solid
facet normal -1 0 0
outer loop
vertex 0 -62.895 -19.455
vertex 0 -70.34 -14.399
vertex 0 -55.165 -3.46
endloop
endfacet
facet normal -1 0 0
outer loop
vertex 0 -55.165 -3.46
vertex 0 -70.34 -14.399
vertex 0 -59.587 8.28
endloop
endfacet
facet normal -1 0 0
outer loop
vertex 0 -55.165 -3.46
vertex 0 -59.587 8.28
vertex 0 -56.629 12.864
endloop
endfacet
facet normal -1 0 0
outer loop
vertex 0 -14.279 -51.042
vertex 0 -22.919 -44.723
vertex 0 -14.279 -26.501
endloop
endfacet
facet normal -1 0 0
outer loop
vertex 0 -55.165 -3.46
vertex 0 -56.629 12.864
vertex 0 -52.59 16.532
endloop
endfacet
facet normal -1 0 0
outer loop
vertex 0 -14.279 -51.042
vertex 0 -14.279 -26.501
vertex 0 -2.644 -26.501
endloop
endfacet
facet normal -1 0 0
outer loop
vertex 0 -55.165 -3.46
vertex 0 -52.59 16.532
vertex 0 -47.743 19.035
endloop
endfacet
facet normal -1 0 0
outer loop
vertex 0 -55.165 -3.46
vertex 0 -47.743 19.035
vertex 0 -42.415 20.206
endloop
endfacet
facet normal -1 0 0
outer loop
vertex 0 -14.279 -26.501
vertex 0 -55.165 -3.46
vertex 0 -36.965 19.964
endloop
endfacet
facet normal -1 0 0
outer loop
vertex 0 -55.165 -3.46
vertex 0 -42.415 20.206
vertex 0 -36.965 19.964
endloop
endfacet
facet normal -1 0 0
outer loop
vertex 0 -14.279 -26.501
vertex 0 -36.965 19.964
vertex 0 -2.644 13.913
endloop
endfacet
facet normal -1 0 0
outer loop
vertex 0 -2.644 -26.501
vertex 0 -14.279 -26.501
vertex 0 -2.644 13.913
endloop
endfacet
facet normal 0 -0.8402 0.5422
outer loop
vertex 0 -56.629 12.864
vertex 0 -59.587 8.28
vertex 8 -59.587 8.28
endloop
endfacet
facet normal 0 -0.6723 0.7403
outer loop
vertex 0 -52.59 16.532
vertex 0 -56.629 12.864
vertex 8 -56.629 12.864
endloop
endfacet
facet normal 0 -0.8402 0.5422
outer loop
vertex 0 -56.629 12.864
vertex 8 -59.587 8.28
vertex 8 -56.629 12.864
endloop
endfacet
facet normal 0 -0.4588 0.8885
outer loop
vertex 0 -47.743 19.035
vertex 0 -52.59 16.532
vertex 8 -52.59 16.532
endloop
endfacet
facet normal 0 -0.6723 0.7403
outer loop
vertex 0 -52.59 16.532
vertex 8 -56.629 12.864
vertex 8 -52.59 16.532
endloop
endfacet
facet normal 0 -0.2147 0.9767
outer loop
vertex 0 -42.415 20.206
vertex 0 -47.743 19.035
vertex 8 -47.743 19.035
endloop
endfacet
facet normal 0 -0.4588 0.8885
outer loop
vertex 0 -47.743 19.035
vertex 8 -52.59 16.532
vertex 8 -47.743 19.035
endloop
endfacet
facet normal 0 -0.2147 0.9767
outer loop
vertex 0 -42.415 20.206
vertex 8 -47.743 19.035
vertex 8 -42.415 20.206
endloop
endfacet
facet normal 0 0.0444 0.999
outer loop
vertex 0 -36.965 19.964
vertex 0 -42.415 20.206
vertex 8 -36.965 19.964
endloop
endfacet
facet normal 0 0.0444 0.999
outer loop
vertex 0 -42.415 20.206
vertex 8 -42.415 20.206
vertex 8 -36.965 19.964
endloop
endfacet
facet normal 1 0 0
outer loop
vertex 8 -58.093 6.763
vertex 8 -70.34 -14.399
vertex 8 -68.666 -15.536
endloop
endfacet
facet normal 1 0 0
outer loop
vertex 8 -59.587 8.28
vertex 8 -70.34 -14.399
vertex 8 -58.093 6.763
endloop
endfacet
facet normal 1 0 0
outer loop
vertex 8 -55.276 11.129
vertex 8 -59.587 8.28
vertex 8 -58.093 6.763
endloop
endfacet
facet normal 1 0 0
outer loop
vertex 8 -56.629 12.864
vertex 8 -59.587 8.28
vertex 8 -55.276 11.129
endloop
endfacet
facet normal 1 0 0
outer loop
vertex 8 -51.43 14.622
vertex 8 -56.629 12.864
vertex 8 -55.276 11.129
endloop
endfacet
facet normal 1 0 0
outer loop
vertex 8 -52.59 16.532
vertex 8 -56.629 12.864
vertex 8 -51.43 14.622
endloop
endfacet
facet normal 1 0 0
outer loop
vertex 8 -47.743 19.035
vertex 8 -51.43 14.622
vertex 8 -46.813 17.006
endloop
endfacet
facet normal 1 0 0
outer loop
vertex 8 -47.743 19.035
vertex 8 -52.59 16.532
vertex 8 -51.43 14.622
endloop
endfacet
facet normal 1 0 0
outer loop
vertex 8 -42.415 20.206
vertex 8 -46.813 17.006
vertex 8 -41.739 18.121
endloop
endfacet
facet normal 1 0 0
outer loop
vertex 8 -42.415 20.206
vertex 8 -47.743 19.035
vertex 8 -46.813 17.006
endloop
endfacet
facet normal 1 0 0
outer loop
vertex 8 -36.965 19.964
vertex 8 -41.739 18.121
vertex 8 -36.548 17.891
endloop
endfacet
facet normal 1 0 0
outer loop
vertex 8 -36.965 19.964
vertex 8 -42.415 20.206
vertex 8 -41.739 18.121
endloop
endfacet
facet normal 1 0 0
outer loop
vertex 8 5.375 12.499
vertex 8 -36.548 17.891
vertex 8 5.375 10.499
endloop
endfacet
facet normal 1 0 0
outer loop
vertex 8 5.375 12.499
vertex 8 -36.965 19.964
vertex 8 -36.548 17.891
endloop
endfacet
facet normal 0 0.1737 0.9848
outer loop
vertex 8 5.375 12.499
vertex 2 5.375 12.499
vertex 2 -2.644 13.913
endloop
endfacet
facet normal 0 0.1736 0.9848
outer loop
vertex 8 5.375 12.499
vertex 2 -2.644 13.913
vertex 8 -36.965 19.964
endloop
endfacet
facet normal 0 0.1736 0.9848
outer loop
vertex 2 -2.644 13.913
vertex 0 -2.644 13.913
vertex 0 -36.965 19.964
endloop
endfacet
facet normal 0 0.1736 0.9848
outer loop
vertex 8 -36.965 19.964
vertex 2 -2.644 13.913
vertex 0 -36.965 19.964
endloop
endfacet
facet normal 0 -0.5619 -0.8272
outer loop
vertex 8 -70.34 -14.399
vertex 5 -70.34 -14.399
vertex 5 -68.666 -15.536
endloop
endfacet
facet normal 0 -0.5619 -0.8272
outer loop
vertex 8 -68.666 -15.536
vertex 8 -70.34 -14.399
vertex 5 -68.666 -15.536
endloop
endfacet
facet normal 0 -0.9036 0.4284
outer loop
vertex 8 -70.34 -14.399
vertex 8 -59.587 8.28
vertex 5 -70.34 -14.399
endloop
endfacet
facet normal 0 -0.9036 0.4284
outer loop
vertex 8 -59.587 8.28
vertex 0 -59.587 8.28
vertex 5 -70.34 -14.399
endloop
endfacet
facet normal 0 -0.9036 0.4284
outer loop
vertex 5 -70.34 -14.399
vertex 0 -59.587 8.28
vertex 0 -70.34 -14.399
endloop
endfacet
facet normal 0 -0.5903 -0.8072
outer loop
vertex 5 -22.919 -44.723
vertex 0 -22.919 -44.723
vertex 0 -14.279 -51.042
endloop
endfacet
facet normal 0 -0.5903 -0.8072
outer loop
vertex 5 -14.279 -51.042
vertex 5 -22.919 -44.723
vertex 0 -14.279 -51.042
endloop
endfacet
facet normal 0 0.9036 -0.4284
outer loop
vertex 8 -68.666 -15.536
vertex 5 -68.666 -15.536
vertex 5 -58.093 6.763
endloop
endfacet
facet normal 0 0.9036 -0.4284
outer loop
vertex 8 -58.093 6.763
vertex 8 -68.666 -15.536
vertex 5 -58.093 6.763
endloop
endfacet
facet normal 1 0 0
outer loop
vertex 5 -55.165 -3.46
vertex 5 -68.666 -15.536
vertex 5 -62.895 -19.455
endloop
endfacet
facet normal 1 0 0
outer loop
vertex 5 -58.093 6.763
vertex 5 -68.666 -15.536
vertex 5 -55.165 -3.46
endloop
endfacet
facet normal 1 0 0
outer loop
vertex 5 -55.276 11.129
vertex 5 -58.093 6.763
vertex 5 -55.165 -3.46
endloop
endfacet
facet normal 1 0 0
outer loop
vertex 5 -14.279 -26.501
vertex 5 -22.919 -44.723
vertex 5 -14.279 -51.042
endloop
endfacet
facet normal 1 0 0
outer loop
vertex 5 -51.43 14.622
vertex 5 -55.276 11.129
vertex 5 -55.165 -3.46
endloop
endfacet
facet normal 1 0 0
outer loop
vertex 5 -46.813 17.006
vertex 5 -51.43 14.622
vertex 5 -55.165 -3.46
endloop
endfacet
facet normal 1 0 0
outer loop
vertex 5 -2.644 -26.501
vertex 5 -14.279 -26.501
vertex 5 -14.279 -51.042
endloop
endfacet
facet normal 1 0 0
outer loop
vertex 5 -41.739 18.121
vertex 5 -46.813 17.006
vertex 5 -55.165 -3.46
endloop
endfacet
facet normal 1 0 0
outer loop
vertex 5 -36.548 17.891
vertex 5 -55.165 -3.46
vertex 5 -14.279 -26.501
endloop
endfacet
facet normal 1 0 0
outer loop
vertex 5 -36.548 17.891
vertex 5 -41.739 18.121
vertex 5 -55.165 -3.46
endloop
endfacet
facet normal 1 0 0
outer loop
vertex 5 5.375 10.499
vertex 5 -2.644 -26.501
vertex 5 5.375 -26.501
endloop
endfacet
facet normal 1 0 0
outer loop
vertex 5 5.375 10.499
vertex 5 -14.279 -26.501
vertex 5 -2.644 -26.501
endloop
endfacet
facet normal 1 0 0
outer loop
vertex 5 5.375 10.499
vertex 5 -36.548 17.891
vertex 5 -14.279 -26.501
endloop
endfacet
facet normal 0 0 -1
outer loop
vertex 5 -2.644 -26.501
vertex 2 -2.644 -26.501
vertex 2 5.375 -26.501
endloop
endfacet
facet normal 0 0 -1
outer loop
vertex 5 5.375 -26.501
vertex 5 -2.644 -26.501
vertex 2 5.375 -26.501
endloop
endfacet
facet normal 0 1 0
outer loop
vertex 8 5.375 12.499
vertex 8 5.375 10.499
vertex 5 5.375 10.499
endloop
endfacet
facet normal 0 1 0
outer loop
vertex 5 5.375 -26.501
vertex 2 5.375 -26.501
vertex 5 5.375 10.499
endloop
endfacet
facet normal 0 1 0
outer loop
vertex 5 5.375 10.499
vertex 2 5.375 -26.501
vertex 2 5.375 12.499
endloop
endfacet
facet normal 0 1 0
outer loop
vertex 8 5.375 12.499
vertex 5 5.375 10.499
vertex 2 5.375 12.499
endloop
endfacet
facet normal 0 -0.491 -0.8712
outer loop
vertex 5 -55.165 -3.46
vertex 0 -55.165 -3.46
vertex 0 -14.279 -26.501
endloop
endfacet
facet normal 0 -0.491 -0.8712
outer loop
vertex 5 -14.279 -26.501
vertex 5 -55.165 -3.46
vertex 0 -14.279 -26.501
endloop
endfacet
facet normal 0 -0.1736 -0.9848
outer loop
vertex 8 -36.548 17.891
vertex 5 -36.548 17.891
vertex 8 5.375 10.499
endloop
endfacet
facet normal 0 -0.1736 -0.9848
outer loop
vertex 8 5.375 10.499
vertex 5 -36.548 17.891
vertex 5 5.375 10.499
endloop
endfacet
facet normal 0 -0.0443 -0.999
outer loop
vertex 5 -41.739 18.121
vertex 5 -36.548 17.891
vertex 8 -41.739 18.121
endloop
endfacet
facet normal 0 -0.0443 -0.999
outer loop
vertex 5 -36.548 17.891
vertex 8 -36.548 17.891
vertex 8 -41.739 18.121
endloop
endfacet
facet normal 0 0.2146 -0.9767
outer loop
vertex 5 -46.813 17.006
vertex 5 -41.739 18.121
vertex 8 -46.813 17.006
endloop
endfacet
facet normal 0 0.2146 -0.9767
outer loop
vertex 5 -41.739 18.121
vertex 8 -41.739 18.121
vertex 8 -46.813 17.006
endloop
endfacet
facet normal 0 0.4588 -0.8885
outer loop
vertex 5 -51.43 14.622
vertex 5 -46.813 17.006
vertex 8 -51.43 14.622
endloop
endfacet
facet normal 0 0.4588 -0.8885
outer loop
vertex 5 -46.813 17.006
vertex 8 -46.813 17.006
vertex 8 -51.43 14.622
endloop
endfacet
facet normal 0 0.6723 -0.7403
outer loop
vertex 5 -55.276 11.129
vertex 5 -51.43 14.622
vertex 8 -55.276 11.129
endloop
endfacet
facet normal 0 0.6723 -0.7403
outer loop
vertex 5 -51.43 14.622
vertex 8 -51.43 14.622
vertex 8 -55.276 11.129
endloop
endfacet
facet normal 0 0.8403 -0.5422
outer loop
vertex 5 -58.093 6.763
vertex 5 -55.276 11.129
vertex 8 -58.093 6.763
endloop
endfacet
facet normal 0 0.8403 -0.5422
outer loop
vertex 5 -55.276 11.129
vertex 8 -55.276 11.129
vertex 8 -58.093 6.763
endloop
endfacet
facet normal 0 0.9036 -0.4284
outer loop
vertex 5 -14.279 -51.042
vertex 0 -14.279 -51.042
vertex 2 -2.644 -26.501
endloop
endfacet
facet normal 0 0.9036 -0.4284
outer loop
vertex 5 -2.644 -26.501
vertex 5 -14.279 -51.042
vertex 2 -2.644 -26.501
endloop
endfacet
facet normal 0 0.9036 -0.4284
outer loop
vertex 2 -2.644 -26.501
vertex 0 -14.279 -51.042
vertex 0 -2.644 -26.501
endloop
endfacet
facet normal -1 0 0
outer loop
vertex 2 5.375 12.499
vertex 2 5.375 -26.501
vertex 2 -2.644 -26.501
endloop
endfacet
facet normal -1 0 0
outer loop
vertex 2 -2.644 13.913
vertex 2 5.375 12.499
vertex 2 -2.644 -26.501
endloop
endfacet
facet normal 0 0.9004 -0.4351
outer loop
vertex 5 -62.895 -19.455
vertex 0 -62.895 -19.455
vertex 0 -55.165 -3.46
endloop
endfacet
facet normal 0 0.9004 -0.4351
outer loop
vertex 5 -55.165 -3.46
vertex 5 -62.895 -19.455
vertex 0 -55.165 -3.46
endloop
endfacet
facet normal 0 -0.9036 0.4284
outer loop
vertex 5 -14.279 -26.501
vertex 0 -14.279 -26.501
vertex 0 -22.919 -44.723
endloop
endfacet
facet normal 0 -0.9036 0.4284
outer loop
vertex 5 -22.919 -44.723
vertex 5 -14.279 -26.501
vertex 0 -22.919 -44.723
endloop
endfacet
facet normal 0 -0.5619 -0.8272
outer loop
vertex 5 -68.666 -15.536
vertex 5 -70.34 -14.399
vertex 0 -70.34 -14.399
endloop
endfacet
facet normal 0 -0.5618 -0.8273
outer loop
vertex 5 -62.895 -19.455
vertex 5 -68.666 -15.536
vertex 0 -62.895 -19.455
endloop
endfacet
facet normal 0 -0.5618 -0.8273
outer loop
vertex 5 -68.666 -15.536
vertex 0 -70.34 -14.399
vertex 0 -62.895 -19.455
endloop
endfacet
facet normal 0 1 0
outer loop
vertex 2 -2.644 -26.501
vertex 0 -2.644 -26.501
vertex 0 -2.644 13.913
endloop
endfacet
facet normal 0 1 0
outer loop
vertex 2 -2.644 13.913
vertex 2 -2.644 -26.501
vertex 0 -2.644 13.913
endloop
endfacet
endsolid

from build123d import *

# Parameters (mm, degrees)
F1_DEPTH = 5
F3_DEPTH = 3
F4_R     = 20
F5_R     = 21
F7_DEPTH = 2


with BuildPart() as f1:
    # F0 (on Right) → F1 (new body)
    with BuildSketch(Plane.YZ):
        Polygon((-2.6435090923, -26.501225133), (5.3746857459, -26.501225133), (5.3746857459, -16.4436940104), (-55.1649013234, -3.4599144195), (-14.2791476101, -26.501225133), (-22.9189545176, -44.7233500122), (-14.2791476101, -51.0418266058), align=None)
        Polygon((-55.1649013234, -3.4599144195), (5.3746857459, -16.4436940104), (5.3746857459, 12.498774867), (-52.7289716819, 22.7440173494), (-70.3398138285, -14.3988225609), (-62.8945189948, -19.4552624983), align=None)
    extrude(amount=F1_DEPTH)

    # F2 (on face) → F3 (join)
    with BuildSketch(Plane.YZ.offset(5)):
        Polygon((5.3746857459, 12.498774867), (-52.7289716819, 22.7440173494), (-70.3398138285, -14.3988225609), (-68.6655286126, -15.5359061582), (-51.5614379211, 20.5381496464), (5.3746857459, 10.498774867), align=None)
    extrude(amount=F3_DEPTH)

    # F4
    f4_edges = [f1.edges().sort_by_distance(p)[0] for p in [
        (6.5, -51.561438, 20.53815),
    ]]
    fillet(f4_edges, radius=F4_R)

    # F5
    f5_edges = [f1.edges().sort_by_distance(p)[0] for p in [
        (4, -52.728972, 22.744017),
    ]]
    fillet(f5_edges, radius=F5_R)

    # F6 (on face) → F7 (cut)
    with BuildSketch(Plane(origin=(0, 0, 0), x_dir=(0, -1, 0), z_dir=(-1, 0, 0))):
        Polygon((2.6435090923, 13.9125989535), (-5.3746857459, 12.498774867), (-5.3746857459, -26.501225133), (2.6435090923, -26.501225133), align=None)
    extrude(amount=-F7_DEPTH, mode=Mode.SUBTRACT)


solid = f1.part
